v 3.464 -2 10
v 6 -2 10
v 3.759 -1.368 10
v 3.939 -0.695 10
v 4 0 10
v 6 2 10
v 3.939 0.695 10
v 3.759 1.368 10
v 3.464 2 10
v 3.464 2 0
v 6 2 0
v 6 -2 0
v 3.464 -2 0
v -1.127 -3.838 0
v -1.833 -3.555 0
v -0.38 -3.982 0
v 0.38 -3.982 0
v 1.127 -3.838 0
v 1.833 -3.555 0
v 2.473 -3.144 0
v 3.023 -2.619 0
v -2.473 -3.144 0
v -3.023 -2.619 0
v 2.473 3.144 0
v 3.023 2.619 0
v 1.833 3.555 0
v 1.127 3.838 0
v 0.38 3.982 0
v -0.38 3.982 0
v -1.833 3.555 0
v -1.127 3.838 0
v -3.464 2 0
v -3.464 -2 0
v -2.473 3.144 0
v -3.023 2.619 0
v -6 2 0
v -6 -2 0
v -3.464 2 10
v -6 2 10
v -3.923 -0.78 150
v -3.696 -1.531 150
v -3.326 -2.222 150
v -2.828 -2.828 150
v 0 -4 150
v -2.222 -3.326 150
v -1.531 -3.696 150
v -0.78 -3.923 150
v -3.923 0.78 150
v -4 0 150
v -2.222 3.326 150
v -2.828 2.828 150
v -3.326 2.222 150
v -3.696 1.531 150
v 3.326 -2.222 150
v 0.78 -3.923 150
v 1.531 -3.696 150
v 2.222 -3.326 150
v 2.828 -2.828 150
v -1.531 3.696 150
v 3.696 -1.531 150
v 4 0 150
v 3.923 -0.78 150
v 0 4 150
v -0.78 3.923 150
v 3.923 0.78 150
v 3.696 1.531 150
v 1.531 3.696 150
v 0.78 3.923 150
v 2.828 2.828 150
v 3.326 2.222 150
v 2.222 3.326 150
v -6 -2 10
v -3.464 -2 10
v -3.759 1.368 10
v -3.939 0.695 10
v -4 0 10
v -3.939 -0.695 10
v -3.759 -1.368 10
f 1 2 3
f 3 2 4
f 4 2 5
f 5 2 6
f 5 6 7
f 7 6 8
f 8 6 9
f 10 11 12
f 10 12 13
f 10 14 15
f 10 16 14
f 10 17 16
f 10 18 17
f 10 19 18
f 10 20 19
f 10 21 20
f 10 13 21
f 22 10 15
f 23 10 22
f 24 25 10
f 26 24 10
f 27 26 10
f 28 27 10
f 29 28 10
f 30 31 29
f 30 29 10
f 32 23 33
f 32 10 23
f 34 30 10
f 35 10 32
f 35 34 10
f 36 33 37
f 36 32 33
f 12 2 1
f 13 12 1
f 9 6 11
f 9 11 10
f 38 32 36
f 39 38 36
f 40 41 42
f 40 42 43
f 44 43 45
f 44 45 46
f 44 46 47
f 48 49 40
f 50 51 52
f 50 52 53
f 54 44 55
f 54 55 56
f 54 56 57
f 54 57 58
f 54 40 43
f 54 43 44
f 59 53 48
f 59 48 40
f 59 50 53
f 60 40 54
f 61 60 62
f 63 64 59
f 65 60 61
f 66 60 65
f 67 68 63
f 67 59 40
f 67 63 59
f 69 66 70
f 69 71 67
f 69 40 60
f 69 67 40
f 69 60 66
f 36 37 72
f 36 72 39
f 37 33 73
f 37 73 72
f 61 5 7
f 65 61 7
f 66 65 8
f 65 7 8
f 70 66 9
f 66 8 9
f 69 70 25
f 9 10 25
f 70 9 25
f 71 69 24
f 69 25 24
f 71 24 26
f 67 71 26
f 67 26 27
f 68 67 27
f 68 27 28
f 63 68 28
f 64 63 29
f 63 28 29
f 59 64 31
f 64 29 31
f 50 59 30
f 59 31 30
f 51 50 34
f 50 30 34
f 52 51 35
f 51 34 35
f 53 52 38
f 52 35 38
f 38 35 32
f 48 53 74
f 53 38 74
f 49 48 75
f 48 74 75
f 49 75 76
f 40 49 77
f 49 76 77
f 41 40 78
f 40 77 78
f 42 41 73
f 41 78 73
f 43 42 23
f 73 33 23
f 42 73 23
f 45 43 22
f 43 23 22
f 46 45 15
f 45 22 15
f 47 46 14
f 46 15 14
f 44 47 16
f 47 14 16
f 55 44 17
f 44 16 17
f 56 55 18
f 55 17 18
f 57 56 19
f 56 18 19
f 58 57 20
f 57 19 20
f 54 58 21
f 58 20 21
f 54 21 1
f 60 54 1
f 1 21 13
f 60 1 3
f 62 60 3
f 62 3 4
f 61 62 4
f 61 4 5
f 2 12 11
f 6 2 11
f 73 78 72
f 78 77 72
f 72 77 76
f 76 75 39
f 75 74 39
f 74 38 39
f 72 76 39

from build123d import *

# Parameters (mm, degrees)
SKETCH_1_R      = 4
EXTRUDE_1_DEPTH = 150
SKETCH_2_W      = 12
SKETCH_2_H      = 4
EXTRUDE_2_DEPTH = 10


with BuildPart() as part:
    # Эскиз1 → Бобышка-Вытянуть1 (new body)
    with BuildSketch(Plane.XY):
        Circle(SKETCH_1_R)
    extrude(amount=EXTRUDE_1_DEPTH)

    # Эскиз2 → Бобышка-Вытянуть2 (add)
    with BuildSketch(Plane(origin=(0, 0, 0), x_dir=(-1, 0, 0), z_dir=(0, 0, -1))):
        Rectangle(SKETCH_2_W, SKETCH_2_H)
    extrude(amount=-EXTRUDE_2_DEPTH)


solid = part.part
